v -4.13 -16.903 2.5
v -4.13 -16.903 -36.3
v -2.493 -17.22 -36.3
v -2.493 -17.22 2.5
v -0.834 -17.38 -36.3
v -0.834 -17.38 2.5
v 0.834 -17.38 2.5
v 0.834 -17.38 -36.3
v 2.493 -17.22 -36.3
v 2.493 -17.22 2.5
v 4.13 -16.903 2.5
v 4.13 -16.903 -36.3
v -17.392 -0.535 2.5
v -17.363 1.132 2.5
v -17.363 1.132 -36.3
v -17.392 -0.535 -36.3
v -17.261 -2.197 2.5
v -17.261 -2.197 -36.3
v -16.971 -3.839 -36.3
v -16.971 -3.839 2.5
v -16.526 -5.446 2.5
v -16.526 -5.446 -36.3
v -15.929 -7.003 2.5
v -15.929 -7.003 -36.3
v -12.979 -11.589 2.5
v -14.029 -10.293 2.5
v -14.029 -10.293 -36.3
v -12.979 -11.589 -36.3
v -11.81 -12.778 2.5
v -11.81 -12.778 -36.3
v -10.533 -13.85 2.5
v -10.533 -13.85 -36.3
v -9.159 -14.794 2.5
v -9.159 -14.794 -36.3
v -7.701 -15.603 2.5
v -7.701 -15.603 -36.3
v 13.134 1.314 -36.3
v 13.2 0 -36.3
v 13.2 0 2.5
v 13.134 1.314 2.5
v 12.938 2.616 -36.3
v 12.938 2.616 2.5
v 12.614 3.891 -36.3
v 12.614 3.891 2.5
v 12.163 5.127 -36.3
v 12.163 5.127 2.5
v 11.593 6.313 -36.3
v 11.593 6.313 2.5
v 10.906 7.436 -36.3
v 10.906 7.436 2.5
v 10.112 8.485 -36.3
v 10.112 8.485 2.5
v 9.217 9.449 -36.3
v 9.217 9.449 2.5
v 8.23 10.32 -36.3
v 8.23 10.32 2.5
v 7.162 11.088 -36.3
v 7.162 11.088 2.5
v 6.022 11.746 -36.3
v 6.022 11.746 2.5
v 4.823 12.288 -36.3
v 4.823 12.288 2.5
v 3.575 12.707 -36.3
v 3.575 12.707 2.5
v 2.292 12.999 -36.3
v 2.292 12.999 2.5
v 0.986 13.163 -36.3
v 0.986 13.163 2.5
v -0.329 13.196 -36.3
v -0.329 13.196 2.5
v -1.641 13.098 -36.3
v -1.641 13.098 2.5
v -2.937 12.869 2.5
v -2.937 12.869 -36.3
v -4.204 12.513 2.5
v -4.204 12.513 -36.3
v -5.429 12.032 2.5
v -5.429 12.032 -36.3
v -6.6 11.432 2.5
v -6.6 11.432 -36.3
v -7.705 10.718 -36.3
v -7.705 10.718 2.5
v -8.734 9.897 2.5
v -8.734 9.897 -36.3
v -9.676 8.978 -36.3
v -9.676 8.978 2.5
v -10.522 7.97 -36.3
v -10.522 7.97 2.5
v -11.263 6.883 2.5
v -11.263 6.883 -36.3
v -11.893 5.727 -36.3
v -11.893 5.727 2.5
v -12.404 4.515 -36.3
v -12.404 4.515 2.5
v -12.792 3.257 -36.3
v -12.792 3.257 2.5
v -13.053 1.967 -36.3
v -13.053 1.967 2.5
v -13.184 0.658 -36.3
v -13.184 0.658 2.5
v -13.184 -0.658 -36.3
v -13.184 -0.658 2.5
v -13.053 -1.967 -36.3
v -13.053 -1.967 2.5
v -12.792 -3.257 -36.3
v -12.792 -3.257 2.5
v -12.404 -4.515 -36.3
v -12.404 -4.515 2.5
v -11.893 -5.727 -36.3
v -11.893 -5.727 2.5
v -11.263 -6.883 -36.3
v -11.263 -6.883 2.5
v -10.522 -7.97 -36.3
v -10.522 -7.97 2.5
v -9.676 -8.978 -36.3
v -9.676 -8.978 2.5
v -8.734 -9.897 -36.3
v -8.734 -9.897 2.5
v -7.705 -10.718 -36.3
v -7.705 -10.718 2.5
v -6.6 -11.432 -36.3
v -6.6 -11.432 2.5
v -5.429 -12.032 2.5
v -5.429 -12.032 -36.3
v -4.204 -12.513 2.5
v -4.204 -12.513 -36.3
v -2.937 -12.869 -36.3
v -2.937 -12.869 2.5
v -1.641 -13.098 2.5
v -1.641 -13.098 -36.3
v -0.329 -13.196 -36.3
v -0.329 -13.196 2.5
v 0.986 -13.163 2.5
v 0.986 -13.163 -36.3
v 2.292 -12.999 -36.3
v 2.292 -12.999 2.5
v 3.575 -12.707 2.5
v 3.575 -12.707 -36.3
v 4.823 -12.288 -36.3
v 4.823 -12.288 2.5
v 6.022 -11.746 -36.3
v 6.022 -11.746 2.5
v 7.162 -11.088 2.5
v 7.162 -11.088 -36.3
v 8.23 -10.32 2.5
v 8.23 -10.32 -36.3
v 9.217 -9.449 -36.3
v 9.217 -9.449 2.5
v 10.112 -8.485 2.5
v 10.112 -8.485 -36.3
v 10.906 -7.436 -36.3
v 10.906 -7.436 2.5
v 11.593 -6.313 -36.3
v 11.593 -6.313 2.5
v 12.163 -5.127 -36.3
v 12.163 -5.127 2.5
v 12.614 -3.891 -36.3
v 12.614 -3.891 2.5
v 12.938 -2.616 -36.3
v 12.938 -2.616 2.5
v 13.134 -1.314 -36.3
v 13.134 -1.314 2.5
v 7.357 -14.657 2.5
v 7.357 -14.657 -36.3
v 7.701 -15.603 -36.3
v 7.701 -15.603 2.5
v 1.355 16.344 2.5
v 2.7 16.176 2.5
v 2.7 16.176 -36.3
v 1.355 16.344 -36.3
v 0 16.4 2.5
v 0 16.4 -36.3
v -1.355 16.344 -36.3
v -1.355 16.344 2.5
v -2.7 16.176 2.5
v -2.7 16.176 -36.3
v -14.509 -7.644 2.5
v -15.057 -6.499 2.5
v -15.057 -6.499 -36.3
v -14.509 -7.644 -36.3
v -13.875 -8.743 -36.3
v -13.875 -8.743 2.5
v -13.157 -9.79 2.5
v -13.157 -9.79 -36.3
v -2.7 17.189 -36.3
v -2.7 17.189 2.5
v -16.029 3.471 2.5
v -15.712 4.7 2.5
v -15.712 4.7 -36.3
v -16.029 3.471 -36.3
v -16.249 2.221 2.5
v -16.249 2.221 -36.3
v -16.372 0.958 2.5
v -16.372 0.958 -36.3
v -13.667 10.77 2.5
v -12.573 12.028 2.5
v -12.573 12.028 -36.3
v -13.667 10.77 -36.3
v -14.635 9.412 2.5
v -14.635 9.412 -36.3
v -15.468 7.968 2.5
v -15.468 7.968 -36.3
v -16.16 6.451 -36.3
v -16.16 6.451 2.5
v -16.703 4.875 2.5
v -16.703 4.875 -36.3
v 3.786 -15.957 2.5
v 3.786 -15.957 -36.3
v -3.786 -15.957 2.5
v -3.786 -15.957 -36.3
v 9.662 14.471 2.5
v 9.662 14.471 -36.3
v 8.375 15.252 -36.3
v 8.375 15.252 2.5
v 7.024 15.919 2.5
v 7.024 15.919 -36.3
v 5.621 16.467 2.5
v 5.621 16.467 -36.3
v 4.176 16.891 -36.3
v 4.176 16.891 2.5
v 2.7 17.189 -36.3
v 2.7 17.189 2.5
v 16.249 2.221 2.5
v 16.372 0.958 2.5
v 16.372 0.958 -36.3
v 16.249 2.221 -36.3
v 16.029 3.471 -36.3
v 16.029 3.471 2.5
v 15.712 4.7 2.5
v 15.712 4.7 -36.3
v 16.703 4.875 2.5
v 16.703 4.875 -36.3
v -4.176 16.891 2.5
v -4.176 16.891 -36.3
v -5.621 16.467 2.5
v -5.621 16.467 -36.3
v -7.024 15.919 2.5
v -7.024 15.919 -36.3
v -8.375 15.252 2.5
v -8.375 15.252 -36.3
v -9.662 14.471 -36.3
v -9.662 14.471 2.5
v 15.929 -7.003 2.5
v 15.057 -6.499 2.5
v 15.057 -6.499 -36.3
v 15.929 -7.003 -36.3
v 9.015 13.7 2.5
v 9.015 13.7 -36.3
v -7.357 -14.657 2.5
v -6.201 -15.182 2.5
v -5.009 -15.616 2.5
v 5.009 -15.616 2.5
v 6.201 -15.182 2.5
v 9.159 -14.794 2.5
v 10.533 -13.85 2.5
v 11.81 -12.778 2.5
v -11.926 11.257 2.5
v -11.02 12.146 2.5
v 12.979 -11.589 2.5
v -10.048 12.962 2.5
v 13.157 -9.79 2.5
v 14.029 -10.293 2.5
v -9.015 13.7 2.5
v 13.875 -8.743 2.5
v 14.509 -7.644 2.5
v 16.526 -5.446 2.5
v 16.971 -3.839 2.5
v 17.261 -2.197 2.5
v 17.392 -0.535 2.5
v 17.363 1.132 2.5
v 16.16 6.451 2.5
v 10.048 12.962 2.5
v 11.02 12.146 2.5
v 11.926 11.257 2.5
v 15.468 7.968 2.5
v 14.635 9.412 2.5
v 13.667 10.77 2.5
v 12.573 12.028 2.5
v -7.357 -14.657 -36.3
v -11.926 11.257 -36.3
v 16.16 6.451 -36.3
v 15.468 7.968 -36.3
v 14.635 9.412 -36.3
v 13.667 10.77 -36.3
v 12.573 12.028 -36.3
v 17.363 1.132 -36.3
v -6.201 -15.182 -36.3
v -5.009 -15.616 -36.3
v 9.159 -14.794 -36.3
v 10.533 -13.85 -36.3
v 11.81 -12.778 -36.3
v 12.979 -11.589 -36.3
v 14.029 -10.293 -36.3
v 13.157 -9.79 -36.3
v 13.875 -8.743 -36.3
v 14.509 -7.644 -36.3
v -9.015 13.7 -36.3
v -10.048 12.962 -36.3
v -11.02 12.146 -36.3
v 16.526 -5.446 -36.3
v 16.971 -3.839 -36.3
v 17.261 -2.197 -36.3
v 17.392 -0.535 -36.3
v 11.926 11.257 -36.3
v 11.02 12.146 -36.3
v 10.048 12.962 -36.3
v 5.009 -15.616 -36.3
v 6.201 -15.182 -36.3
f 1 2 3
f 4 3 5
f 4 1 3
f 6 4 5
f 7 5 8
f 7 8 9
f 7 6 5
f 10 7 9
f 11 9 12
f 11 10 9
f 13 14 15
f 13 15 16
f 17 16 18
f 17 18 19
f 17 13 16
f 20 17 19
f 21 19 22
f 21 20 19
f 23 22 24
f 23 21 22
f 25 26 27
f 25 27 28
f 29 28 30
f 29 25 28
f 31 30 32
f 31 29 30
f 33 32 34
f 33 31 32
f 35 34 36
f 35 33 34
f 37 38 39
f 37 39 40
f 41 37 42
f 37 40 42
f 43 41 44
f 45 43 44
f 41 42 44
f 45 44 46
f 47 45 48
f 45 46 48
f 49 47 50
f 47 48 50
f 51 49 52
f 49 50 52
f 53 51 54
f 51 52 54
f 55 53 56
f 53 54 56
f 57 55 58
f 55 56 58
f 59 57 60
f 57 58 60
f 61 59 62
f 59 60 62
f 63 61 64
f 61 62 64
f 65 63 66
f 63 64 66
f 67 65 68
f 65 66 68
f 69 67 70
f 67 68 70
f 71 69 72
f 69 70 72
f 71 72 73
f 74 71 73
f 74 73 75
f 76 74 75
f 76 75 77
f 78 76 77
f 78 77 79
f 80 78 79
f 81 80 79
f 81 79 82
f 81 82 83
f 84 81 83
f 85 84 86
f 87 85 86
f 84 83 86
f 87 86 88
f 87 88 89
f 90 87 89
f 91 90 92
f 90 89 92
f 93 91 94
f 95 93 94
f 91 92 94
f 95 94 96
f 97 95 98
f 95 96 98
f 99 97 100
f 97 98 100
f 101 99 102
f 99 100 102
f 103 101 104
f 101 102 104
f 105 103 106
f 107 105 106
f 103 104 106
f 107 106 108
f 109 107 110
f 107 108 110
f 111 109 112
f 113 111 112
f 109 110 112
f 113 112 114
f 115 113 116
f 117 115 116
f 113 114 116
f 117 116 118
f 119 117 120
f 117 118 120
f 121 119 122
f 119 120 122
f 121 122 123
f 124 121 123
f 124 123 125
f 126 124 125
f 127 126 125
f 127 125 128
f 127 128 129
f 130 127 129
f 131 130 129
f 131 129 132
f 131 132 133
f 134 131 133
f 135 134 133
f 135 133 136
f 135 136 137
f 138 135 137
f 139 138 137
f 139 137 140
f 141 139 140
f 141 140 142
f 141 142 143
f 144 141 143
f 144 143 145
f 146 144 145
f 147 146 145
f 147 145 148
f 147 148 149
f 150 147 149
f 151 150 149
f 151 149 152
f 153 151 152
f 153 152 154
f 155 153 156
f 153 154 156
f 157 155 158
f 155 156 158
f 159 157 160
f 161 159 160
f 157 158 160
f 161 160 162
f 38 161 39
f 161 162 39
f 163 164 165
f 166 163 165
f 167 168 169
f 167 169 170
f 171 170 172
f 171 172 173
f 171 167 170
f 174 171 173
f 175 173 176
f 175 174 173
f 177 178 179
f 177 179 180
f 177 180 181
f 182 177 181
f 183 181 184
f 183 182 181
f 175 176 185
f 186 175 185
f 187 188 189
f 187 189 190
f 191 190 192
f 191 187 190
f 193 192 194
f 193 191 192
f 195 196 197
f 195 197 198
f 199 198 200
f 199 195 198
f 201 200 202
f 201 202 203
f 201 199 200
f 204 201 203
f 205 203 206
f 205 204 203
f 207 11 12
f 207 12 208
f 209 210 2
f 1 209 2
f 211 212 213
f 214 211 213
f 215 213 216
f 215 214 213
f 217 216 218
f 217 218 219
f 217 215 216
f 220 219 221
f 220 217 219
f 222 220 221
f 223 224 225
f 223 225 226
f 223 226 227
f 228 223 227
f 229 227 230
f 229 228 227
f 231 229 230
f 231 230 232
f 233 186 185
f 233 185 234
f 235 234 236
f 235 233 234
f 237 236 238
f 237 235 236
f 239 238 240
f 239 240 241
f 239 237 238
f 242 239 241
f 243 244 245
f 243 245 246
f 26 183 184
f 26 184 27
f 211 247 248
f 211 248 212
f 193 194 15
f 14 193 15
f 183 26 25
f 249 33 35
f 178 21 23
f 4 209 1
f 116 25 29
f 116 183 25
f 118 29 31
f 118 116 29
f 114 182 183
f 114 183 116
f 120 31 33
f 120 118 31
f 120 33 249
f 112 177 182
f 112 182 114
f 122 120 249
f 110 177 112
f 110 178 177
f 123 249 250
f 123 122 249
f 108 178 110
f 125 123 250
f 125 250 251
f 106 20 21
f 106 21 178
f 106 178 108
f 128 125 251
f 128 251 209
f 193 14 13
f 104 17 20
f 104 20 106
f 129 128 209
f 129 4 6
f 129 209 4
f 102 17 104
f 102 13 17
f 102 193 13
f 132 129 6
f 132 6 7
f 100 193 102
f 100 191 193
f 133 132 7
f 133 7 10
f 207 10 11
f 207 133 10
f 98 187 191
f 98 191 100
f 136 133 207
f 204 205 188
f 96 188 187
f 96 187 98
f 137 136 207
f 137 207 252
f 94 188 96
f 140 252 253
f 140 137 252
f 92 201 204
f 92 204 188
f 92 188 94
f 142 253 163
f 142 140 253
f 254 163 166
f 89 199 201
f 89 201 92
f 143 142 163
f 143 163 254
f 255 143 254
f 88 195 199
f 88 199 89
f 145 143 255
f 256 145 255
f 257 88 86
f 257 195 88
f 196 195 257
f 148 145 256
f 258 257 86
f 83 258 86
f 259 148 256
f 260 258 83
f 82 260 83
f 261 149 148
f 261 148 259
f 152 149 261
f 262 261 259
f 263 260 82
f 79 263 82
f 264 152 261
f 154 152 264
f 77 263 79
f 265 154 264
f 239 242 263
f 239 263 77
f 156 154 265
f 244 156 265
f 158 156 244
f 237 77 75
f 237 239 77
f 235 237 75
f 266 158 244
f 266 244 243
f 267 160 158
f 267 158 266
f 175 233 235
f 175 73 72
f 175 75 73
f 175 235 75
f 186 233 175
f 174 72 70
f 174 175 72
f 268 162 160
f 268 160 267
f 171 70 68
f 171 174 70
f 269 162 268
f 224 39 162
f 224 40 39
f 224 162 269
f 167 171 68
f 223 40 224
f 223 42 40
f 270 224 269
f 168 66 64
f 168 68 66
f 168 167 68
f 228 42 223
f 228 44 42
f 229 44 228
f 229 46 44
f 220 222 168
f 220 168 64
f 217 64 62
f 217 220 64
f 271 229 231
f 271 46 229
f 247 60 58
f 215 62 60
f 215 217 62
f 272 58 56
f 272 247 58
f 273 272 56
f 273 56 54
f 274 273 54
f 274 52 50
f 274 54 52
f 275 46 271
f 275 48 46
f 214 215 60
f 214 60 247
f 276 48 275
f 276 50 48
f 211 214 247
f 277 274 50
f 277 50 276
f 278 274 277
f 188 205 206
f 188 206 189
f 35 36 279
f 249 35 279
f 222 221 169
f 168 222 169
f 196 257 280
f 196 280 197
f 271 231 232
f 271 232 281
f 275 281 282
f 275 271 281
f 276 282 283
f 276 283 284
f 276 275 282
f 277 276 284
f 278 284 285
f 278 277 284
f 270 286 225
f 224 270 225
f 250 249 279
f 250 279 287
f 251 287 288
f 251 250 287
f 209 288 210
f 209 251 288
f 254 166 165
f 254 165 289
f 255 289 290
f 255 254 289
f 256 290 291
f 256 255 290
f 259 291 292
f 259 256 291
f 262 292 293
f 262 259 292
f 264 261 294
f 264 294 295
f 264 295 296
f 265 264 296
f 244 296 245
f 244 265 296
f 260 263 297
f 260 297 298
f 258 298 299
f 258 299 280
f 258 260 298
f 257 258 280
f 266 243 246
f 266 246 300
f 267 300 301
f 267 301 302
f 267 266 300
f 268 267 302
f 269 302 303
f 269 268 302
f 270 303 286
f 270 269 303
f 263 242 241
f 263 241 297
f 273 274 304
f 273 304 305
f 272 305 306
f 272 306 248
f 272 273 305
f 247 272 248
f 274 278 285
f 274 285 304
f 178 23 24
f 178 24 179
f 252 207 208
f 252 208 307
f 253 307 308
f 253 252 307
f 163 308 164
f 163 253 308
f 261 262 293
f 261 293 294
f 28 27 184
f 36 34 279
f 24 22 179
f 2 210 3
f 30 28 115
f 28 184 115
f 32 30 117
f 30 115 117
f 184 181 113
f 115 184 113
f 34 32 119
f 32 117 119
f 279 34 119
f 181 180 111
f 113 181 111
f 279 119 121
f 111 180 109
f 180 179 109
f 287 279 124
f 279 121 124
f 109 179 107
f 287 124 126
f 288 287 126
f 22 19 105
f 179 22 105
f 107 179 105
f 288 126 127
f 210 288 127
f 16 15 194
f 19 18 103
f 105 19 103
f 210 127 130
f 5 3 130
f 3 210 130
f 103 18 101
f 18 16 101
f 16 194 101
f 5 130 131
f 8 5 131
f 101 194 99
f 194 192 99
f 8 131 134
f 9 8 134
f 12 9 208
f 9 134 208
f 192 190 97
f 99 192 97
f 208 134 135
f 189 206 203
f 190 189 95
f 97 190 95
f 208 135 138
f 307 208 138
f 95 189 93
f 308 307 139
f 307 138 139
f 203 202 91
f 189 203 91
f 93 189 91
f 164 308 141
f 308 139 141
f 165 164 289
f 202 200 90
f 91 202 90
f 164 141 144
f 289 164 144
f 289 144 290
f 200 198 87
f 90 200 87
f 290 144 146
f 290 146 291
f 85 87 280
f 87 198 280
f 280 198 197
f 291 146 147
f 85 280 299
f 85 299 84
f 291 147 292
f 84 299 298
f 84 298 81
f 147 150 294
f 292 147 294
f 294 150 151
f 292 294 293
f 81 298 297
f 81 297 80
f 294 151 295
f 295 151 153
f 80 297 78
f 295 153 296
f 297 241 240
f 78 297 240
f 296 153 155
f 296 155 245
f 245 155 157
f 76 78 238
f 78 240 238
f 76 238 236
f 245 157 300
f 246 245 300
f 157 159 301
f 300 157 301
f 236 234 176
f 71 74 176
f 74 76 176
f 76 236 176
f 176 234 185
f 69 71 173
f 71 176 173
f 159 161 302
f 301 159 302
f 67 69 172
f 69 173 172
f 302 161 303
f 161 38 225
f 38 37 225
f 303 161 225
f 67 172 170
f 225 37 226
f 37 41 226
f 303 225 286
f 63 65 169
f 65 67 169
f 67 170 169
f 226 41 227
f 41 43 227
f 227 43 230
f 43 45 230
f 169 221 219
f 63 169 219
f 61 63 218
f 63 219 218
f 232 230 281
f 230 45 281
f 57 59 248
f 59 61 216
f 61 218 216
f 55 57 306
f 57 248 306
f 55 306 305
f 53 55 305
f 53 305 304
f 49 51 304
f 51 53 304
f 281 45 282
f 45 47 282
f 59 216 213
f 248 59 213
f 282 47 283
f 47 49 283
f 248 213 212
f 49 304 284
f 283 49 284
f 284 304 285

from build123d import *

# Parameters (mm, degrees)
SK_ESTRIADO_R = 13.2
EJE_DEPTH     = 38.8


with BuildPart() as part:
    # Sk_Estriado → Eje (new body)
    with BuildSketch(Plane.XY.offset(2.5)):
        with BuildLine():
            Line((2.7, 17.189240821), (2.7, 16.17621711))
            ThreePointArc((2.7, 16.17621711), (0, 16.4), (-2.7, 16.17621711))
            Line((-2.7, 16.17621711), (-2.7, 17.189240821))
            ThreePointArc((-2.7, 17.189240821), (-6.328756096, 16.208233904), (-9.662140027, 14.47076536))
            Line((-9.662140027, 14.47076536), (-9.01524753, 13.699828903))
            ThreePointArc((-9.01524753, 13.699828903), (-10.541716799, 12.563128867), (-11.926216414, 11.257235986))
            Line((-11.926216414, 11.257235986), (-12.573108911, 12.028172443))
            ThreePointArc((-12.573108911, 12.028172443), (-15.068842026, 8.7), (-16.703257352, 4.874545499))
            Line((-16.703257352, 4.874545499), (-15.712160547, 4.699788392))
            ThreePointArc((-15.712160547, 4.699788392), (-16.150847149, 2.847830114), (-16.372023623, 0.957518931))
            Line((-16.372023623, 0.957518931), (-17.363120427, 1.132276038))
            ThreePointArc((-17.363120427, 1.132276038), (-17.135654902, -3.021478291), (-15.928734927, -7.002528375))
            Line((-15.928734927, -7.002528375), (-15.057179023, -6.49933534))
            ThreePointArc((-15.057179023, -6.49933534), (-14.202816622, -8.2), (-13.157179023, -9.790231874))
            Line((-13.157179023, -9.790231874), (-14.028734927, -10.293424909))
            ThreePointArc((-14.028734927, -10.293424909), (-11.184504409, -13.32917331), (-7.700980401, -15.603041398))
            Line((-7.700980401, -15.603041398), (-7.356776093, -14.657347834))
            ThreePointArc((-7.356776093, -14.657347834), (-5.609130351, -15.410958981), (-3.785944134, -15.957024379))
            Line((-3.785944134, -15.957024379), (-4.130148442, -16.902717943))
            ThreePointArc((-4.130148442, -16.902717943), (0, -17.4), (4.130148442, -16.902717943))
            Line((4.130148442, -16.902717943), (3.785944134, -15.957024379))
            ThreePointArc((3.785944134, -15.957024379), (5.609130351, -15.410958981), (7.356776093, -14.657347834))
            Line((7.356776093, -14.657347834), (7.700980401, -15.603041398))
            ThreePointArc((7.700980401, -15.603041398), (11.184504409, -13.32917331), (14.028734927, -10.293424909))
            Line((14.028734927, -10.293424909), (13.157179023, -9.790231874))
            ThreePointArc((13.157179023, -9.790231874), (14.202816622, -8.2), (15.057179023, -6.49933534))
            Line((15.057179023, -6.49933534), (15.928734927, -7.002528375))
            ThreePointArc((15.928734927, -7.002528375), (17.135654902, -3.021478291), (17.363120427, 1.132276038))
            Line((17.363120427, 1.132276038), (16.372023623, 0.957518931))
            ThreePointArc((16.372023623, 0.957518931), (16.150847149, 2.847830114), (15.712160547, 4.699788392))
            Line((15.712160547, 4.699788392), (16.703257352, 4.874545499))
            ThreePointArc((16.703257352, 4.874545499), (15.068842026, 8.7), (12.573108911, 12.028172443))
            Line((12.573108911, 12.028172443), (11.926216414, 11.257235986))
            ThreePointArc((11.926216414, 11.257235986), (10.541716799, 12.563128867), (9.01524753, 13.699828903))
            Line((9.01524753, 13.699828903), (9.662140027, 14.47076536))
            ThreePointArc((9.662140027, 14.47076536), (6.328756096, 16.208233904), (2.7, 17.189240821))
        make_face()
        Circle(SK_ESTRIADO_R, mode=Mode.SUBTRACT)
    extrude(amount=-EJE_DEPTH)


solid = part.part
